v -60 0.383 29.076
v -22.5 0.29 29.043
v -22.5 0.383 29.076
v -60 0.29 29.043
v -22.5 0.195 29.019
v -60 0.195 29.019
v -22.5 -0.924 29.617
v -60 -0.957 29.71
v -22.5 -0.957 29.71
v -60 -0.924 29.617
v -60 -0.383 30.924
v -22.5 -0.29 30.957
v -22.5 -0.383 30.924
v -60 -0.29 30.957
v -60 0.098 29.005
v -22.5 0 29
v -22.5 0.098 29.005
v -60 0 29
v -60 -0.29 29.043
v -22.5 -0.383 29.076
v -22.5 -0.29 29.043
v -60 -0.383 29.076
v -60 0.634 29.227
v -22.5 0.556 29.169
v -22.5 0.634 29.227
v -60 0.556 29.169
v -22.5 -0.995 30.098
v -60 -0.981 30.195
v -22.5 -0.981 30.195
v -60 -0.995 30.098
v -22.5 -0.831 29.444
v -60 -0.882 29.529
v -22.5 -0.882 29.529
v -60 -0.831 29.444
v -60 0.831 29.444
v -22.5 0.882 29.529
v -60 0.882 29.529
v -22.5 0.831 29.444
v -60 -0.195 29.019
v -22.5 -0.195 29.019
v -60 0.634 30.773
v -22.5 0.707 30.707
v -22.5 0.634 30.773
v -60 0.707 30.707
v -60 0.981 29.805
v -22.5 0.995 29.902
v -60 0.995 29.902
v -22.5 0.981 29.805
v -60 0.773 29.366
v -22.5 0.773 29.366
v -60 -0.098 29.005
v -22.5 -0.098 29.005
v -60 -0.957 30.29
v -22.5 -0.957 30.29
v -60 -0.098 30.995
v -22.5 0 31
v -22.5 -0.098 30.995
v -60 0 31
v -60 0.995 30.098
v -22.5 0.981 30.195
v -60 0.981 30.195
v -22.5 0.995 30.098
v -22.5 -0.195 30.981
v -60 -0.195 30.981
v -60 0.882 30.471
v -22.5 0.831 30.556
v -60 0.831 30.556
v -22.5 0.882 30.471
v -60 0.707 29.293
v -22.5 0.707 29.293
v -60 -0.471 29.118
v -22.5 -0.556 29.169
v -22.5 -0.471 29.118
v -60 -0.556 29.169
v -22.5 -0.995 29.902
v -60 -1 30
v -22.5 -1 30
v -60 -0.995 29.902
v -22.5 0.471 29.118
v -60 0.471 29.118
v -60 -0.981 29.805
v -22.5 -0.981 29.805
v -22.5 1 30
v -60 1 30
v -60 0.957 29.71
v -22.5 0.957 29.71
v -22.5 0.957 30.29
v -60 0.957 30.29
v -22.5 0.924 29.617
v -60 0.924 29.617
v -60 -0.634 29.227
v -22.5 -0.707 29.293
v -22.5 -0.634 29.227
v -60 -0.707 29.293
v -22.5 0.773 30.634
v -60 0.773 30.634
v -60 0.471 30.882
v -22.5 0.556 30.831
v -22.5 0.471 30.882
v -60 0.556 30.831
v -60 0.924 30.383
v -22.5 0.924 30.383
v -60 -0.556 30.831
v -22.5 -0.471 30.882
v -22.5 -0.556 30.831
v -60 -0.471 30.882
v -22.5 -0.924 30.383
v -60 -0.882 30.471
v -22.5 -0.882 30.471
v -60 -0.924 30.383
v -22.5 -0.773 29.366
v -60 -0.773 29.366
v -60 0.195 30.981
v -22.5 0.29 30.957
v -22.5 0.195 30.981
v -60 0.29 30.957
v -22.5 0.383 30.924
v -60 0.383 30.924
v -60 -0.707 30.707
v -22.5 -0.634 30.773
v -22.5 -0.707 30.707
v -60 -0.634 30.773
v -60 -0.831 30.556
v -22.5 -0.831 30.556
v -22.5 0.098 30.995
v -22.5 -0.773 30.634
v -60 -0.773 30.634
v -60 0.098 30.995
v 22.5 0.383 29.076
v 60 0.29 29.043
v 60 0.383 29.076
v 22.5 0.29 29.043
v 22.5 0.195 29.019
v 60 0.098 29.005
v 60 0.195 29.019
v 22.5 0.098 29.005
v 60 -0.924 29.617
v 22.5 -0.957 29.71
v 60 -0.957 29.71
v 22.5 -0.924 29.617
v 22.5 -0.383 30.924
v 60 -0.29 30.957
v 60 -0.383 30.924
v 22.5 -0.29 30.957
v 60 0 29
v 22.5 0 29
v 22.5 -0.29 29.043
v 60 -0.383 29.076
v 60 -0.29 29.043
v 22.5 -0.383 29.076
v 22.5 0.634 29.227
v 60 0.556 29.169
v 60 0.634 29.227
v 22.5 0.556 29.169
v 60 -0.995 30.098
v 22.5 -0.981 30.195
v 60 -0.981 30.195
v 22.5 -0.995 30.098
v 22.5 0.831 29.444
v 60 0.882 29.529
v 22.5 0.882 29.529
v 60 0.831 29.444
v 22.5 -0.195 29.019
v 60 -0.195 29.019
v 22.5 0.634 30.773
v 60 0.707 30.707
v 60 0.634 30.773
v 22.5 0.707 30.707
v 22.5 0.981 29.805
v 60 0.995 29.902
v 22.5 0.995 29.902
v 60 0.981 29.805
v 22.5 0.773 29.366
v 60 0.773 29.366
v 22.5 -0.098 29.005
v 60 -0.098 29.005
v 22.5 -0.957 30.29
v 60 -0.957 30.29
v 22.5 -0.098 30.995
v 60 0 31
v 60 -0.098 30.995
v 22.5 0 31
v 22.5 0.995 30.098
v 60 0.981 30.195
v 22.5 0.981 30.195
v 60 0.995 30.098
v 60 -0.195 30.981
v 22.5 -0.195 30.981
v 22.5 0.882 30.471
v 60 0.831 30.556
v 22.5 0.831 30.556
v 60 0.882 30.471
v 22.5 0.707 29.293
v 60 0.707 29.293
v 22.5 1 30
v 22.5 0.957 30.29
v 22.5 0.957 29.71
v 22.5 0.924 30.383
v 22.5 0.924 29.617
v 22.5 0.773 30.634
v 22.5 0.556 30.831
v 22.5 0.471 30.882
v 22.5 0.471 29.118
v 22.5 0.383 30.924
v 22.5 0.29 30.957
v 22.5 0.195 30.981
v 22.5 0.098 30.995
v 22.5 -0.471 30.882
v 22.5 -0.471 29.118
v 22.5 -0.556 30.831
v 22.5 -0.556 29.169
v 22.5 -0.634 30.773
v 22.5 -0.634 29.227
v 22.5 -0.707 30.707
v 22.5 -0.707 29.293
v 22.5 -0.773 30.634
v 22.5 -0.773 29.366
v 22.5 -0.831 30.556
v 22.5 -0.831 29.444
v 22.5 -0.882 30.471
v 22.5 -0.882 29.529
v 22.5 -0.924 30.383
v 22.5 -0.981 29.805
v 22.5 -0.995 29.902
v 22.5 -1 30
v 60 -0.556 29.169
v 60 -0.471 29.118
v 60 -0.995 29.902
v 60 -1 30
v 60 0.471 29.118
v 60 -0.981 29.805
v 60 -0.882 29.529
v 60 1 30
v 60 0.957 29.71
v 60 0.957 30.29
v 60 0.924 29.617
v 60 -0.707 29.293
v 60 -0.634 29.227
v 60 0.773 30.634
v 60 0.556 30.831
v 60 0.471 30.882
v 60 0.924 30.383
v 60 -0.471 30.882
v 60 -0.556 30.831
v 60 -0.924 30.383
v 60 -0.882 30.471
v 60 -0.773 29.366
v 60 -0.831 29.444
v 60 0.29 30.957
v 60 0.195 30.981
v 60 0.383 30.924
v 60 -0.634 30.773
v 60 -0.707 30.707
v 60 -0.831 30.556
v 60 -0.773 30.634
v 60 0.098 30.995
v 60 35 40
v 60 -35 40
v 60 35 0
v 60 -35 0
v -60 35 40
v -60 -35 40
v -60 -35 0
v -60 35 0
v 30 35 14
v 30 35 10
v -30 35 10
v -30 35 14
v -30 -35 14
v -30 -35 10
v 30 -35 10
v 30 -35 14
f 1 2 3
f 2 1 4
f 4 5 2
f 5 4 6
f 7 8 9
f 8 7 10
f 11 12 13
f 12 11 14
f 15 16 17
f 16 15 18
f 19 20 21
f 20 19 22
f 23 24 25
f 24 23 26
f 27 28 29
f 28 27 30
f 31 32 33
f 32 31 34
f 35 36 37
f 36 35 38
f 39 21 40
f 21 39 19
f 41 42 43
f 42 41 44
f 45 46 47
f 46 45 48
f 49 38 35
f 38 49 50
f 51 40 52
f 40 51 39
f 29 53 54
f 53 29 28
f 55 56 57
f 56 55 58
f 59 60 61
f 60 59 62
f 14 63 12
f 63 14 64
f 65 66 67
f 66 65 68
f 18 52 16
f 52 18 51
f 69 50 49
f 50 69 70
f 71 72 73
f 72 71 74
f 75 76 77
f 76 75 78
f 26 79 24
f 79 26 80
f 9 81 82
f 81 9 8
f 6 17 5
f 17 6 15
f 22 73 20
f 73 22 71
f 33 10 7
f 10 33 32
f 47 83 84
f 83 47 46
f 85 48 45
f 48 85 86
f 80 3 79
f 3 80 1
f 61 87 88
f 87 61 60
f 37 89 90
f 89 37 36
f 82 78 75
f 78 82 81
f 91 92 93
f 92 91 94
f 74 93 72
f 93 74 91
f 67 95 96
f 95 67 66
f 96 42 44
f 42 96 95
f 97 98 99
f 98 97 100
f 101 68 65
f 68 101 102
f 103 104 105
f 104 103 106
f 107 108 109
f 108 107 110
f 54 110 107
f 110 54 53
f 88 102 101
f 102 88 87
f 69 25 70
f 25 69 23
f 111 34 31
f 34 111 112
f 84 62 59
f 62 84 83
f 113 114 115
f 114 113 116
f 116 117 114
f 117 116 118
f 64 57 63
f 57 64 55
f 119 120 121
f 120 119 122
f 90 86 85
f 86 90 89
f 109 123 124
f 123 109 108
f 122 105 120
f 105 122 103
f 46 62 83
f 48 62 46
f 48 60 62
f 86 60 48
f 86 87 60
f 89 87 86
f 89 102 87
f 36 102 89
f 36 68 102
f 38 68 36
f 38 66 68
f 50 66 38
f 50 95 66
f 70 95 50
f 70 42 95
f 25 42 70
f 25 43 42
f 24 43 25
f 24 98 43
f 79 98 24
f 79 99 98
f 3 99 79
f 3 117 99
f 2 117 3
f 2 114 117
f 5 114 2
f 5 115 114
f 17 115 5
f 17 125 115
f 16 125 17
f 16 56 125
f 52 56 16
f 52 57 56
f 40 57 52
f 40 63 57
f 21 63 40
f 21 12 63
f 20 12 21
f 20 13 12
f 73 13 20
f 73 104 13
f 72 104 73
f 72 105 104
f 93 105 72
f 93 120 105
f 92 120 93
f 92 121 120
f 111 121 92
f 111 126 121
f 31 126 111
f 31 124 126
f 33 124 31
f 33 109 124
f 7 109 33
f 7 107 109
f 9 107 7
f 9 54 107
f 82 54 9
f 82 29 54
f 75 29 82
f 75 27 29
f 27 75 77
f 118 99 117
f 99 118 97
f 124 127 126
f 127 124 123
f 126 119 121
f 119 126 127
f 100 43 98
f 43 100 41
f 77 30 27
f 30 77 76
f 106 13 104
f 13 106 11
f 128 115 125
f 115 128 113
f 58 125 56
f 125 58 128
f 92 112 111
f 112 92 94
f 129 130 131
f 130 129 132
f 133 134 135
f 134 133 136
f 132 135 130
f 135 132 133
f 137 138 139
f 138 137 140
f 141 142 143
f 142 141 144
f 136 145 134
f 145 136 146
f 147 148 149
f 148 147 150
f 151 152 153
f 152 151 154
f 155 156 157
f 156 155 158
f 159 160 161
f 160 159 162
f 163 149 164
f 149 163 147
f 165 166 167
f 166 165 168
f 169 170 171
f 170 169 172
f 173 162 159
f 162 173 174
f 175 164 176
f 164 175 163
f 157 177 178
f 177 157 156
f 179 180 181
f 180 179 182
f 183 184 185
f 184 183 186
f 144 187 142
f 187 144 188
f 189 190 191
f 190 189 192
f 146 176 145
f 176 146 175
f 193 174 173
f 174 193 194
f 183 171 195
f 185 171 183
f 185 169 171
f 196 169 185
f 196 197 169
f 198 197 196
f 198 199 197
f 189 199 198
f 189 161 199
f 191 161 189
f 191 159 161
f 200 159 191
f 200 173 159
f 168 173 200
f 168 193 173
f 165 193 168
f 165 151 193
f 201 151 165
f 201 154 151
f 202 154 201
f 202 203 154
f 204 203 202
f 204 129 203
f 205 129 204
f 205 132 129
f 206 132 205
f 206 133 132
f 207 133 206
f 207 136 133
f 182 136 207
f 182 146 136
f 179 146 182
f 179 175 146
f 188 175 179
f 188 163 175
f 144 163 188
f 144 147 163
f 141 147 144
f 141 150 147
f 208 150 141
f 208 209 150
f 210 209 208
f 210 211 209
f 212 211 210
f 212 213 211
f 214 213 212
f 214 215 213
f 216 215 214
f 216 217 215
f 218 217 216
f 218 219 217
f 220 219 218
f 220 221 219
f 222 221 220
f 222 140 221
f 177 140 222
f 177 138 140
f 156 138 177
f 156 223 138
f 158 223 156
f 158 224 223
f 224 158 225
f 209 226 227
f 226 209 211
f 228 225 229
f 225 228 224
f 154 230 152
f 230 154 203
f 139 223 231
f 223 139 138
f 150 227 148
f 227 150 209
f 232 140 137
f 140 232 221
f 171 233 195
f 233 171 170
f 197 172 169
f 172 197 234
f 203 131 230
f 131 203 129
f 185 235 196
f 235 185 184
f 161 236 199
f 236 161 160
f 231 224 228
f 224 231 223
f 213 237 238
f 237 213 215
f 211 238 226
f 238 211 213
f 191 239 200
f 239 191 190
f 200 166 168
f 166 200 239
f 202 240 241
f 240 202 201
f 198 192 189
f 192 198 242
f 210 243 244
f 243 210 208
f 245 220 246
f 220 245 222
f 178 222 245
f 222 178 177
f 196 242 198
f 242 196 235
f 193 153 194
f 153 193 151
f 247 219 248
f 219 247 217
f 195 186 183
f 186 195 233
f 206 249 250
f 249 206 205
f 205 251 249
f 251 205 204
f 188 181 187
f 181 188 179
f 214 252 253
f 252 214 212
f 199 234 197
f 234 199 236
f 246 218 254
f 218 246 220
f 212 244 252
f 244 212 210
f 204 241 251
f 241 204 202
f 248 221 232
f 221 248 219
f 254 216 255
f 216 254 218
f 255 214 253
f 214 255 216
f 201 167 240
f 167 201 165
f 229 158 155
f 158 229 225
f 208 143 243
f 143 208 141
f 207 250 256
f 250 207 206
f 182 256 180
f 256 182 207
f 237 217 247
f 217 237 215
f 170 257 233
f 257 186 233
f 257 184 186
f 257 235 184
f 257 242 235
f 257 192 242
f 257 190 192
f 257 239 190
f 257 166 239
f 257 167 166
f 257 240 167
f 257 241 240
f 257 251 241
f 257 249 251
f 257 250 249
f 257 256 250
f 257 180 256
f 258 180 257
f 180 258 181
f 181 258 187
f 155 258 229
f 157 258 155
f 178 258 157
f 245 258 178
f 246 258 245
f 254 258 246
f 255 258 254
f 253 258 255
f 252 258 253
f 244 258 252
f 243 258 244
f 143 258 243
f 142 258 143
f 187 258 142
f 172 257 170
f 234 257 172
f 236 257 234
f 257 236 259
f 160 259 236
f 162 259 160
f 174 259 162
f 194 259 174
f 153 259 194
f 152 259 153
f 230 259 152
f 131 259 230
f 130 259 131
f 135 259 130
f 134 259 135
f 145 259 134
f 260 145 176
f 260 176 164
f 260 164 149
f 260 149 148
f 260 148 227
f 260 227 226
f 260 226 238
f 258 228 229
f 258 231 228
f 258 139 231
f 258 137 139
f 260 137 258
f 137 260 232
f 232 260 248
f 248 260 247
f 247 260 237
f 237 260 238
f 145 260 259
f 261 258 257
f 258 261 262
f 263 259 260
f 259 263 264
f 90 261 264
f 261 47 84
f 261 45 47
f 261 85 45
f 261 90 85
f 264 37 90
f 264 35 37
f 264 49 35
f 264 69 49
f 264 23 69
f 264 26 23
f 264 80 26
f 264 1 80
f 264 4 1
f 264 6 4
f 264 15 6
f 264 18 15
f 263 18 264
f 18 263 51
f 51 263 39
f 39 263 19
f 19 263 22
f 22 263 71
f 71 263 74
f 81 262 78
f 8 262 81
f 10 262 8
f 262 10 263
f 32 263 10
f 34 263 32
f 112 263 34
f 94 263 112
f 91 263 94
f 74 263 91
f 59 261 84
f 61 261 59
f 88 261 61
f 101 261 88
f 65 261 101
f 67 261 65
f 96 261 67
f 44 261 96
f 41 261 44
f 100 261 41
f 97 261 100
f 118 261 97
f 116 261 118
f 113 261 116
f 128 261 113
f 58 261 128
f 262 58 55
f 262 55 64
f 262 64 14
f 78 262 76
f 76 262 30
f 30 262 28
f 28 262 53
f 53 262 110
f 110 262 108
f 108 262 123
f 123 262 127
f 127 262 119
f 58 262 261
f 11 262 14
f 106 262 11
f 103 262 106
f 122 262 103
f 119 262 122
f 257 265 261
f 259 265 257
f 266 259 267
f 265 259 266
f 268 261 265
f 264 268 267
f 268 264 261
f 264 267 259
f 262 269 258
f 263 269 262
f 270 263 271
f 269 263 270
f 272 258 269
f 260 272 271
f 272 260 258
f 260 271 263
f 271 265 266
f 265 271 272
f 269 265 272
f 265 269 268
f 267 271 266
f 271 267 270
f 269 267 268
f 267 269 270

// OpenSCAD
// Mini horizontal gel-electrophoresis box - buffer tank
// Print orientation: tank rests on XY plane, open top facing +Z

$fn = 64;

// ---- Tank dimensions ----
tank_x      = 120;   // outer length (X)
tank_y      = 70;    // outer width (Y)
tank_h      = 40;    // outer height (Z)
wall        = 3;     // wall thickness
floor       = 3;     // floor thickness

// ---- Platform dimensions ----
plat_x      = 60;    // platform length in X (centred)
plat_top_z  = 13;    // platform top height above tank bottom

// ---- Hole dimensions ----
hole_d      = 2;     // electrode hole diameter
hole_y      = 0;     // hole centre Y
hole_z      = 30;    // hole centre Z

// ---- Derived ----
inner_h = tank_h - floor;   // inner floor to top (open)
eps     = 0.5;              // cutter overshoot

difference() {
    // Tank body
    translate([-tank_x/2, -tank_y/2, 0])
        cube([tank_x, tank_y, tank_h]);

    // Raised platform (solid, through walls)
    translate([-plat_x/2, -tank_y/2, plat_top_z - wall])
        cube([plat_x, tank_y, wall + 1]);

    // Horizontal electrode holes through end walls
    for (sx = [-1, 1])
        translate([sx * (tank_x/2 - hole_d), hole_y, hole_z])
            rotate([0, 90, 0])
                cylinder(d = hole_d, h = tank_y + 2*eps, center = true);
}
